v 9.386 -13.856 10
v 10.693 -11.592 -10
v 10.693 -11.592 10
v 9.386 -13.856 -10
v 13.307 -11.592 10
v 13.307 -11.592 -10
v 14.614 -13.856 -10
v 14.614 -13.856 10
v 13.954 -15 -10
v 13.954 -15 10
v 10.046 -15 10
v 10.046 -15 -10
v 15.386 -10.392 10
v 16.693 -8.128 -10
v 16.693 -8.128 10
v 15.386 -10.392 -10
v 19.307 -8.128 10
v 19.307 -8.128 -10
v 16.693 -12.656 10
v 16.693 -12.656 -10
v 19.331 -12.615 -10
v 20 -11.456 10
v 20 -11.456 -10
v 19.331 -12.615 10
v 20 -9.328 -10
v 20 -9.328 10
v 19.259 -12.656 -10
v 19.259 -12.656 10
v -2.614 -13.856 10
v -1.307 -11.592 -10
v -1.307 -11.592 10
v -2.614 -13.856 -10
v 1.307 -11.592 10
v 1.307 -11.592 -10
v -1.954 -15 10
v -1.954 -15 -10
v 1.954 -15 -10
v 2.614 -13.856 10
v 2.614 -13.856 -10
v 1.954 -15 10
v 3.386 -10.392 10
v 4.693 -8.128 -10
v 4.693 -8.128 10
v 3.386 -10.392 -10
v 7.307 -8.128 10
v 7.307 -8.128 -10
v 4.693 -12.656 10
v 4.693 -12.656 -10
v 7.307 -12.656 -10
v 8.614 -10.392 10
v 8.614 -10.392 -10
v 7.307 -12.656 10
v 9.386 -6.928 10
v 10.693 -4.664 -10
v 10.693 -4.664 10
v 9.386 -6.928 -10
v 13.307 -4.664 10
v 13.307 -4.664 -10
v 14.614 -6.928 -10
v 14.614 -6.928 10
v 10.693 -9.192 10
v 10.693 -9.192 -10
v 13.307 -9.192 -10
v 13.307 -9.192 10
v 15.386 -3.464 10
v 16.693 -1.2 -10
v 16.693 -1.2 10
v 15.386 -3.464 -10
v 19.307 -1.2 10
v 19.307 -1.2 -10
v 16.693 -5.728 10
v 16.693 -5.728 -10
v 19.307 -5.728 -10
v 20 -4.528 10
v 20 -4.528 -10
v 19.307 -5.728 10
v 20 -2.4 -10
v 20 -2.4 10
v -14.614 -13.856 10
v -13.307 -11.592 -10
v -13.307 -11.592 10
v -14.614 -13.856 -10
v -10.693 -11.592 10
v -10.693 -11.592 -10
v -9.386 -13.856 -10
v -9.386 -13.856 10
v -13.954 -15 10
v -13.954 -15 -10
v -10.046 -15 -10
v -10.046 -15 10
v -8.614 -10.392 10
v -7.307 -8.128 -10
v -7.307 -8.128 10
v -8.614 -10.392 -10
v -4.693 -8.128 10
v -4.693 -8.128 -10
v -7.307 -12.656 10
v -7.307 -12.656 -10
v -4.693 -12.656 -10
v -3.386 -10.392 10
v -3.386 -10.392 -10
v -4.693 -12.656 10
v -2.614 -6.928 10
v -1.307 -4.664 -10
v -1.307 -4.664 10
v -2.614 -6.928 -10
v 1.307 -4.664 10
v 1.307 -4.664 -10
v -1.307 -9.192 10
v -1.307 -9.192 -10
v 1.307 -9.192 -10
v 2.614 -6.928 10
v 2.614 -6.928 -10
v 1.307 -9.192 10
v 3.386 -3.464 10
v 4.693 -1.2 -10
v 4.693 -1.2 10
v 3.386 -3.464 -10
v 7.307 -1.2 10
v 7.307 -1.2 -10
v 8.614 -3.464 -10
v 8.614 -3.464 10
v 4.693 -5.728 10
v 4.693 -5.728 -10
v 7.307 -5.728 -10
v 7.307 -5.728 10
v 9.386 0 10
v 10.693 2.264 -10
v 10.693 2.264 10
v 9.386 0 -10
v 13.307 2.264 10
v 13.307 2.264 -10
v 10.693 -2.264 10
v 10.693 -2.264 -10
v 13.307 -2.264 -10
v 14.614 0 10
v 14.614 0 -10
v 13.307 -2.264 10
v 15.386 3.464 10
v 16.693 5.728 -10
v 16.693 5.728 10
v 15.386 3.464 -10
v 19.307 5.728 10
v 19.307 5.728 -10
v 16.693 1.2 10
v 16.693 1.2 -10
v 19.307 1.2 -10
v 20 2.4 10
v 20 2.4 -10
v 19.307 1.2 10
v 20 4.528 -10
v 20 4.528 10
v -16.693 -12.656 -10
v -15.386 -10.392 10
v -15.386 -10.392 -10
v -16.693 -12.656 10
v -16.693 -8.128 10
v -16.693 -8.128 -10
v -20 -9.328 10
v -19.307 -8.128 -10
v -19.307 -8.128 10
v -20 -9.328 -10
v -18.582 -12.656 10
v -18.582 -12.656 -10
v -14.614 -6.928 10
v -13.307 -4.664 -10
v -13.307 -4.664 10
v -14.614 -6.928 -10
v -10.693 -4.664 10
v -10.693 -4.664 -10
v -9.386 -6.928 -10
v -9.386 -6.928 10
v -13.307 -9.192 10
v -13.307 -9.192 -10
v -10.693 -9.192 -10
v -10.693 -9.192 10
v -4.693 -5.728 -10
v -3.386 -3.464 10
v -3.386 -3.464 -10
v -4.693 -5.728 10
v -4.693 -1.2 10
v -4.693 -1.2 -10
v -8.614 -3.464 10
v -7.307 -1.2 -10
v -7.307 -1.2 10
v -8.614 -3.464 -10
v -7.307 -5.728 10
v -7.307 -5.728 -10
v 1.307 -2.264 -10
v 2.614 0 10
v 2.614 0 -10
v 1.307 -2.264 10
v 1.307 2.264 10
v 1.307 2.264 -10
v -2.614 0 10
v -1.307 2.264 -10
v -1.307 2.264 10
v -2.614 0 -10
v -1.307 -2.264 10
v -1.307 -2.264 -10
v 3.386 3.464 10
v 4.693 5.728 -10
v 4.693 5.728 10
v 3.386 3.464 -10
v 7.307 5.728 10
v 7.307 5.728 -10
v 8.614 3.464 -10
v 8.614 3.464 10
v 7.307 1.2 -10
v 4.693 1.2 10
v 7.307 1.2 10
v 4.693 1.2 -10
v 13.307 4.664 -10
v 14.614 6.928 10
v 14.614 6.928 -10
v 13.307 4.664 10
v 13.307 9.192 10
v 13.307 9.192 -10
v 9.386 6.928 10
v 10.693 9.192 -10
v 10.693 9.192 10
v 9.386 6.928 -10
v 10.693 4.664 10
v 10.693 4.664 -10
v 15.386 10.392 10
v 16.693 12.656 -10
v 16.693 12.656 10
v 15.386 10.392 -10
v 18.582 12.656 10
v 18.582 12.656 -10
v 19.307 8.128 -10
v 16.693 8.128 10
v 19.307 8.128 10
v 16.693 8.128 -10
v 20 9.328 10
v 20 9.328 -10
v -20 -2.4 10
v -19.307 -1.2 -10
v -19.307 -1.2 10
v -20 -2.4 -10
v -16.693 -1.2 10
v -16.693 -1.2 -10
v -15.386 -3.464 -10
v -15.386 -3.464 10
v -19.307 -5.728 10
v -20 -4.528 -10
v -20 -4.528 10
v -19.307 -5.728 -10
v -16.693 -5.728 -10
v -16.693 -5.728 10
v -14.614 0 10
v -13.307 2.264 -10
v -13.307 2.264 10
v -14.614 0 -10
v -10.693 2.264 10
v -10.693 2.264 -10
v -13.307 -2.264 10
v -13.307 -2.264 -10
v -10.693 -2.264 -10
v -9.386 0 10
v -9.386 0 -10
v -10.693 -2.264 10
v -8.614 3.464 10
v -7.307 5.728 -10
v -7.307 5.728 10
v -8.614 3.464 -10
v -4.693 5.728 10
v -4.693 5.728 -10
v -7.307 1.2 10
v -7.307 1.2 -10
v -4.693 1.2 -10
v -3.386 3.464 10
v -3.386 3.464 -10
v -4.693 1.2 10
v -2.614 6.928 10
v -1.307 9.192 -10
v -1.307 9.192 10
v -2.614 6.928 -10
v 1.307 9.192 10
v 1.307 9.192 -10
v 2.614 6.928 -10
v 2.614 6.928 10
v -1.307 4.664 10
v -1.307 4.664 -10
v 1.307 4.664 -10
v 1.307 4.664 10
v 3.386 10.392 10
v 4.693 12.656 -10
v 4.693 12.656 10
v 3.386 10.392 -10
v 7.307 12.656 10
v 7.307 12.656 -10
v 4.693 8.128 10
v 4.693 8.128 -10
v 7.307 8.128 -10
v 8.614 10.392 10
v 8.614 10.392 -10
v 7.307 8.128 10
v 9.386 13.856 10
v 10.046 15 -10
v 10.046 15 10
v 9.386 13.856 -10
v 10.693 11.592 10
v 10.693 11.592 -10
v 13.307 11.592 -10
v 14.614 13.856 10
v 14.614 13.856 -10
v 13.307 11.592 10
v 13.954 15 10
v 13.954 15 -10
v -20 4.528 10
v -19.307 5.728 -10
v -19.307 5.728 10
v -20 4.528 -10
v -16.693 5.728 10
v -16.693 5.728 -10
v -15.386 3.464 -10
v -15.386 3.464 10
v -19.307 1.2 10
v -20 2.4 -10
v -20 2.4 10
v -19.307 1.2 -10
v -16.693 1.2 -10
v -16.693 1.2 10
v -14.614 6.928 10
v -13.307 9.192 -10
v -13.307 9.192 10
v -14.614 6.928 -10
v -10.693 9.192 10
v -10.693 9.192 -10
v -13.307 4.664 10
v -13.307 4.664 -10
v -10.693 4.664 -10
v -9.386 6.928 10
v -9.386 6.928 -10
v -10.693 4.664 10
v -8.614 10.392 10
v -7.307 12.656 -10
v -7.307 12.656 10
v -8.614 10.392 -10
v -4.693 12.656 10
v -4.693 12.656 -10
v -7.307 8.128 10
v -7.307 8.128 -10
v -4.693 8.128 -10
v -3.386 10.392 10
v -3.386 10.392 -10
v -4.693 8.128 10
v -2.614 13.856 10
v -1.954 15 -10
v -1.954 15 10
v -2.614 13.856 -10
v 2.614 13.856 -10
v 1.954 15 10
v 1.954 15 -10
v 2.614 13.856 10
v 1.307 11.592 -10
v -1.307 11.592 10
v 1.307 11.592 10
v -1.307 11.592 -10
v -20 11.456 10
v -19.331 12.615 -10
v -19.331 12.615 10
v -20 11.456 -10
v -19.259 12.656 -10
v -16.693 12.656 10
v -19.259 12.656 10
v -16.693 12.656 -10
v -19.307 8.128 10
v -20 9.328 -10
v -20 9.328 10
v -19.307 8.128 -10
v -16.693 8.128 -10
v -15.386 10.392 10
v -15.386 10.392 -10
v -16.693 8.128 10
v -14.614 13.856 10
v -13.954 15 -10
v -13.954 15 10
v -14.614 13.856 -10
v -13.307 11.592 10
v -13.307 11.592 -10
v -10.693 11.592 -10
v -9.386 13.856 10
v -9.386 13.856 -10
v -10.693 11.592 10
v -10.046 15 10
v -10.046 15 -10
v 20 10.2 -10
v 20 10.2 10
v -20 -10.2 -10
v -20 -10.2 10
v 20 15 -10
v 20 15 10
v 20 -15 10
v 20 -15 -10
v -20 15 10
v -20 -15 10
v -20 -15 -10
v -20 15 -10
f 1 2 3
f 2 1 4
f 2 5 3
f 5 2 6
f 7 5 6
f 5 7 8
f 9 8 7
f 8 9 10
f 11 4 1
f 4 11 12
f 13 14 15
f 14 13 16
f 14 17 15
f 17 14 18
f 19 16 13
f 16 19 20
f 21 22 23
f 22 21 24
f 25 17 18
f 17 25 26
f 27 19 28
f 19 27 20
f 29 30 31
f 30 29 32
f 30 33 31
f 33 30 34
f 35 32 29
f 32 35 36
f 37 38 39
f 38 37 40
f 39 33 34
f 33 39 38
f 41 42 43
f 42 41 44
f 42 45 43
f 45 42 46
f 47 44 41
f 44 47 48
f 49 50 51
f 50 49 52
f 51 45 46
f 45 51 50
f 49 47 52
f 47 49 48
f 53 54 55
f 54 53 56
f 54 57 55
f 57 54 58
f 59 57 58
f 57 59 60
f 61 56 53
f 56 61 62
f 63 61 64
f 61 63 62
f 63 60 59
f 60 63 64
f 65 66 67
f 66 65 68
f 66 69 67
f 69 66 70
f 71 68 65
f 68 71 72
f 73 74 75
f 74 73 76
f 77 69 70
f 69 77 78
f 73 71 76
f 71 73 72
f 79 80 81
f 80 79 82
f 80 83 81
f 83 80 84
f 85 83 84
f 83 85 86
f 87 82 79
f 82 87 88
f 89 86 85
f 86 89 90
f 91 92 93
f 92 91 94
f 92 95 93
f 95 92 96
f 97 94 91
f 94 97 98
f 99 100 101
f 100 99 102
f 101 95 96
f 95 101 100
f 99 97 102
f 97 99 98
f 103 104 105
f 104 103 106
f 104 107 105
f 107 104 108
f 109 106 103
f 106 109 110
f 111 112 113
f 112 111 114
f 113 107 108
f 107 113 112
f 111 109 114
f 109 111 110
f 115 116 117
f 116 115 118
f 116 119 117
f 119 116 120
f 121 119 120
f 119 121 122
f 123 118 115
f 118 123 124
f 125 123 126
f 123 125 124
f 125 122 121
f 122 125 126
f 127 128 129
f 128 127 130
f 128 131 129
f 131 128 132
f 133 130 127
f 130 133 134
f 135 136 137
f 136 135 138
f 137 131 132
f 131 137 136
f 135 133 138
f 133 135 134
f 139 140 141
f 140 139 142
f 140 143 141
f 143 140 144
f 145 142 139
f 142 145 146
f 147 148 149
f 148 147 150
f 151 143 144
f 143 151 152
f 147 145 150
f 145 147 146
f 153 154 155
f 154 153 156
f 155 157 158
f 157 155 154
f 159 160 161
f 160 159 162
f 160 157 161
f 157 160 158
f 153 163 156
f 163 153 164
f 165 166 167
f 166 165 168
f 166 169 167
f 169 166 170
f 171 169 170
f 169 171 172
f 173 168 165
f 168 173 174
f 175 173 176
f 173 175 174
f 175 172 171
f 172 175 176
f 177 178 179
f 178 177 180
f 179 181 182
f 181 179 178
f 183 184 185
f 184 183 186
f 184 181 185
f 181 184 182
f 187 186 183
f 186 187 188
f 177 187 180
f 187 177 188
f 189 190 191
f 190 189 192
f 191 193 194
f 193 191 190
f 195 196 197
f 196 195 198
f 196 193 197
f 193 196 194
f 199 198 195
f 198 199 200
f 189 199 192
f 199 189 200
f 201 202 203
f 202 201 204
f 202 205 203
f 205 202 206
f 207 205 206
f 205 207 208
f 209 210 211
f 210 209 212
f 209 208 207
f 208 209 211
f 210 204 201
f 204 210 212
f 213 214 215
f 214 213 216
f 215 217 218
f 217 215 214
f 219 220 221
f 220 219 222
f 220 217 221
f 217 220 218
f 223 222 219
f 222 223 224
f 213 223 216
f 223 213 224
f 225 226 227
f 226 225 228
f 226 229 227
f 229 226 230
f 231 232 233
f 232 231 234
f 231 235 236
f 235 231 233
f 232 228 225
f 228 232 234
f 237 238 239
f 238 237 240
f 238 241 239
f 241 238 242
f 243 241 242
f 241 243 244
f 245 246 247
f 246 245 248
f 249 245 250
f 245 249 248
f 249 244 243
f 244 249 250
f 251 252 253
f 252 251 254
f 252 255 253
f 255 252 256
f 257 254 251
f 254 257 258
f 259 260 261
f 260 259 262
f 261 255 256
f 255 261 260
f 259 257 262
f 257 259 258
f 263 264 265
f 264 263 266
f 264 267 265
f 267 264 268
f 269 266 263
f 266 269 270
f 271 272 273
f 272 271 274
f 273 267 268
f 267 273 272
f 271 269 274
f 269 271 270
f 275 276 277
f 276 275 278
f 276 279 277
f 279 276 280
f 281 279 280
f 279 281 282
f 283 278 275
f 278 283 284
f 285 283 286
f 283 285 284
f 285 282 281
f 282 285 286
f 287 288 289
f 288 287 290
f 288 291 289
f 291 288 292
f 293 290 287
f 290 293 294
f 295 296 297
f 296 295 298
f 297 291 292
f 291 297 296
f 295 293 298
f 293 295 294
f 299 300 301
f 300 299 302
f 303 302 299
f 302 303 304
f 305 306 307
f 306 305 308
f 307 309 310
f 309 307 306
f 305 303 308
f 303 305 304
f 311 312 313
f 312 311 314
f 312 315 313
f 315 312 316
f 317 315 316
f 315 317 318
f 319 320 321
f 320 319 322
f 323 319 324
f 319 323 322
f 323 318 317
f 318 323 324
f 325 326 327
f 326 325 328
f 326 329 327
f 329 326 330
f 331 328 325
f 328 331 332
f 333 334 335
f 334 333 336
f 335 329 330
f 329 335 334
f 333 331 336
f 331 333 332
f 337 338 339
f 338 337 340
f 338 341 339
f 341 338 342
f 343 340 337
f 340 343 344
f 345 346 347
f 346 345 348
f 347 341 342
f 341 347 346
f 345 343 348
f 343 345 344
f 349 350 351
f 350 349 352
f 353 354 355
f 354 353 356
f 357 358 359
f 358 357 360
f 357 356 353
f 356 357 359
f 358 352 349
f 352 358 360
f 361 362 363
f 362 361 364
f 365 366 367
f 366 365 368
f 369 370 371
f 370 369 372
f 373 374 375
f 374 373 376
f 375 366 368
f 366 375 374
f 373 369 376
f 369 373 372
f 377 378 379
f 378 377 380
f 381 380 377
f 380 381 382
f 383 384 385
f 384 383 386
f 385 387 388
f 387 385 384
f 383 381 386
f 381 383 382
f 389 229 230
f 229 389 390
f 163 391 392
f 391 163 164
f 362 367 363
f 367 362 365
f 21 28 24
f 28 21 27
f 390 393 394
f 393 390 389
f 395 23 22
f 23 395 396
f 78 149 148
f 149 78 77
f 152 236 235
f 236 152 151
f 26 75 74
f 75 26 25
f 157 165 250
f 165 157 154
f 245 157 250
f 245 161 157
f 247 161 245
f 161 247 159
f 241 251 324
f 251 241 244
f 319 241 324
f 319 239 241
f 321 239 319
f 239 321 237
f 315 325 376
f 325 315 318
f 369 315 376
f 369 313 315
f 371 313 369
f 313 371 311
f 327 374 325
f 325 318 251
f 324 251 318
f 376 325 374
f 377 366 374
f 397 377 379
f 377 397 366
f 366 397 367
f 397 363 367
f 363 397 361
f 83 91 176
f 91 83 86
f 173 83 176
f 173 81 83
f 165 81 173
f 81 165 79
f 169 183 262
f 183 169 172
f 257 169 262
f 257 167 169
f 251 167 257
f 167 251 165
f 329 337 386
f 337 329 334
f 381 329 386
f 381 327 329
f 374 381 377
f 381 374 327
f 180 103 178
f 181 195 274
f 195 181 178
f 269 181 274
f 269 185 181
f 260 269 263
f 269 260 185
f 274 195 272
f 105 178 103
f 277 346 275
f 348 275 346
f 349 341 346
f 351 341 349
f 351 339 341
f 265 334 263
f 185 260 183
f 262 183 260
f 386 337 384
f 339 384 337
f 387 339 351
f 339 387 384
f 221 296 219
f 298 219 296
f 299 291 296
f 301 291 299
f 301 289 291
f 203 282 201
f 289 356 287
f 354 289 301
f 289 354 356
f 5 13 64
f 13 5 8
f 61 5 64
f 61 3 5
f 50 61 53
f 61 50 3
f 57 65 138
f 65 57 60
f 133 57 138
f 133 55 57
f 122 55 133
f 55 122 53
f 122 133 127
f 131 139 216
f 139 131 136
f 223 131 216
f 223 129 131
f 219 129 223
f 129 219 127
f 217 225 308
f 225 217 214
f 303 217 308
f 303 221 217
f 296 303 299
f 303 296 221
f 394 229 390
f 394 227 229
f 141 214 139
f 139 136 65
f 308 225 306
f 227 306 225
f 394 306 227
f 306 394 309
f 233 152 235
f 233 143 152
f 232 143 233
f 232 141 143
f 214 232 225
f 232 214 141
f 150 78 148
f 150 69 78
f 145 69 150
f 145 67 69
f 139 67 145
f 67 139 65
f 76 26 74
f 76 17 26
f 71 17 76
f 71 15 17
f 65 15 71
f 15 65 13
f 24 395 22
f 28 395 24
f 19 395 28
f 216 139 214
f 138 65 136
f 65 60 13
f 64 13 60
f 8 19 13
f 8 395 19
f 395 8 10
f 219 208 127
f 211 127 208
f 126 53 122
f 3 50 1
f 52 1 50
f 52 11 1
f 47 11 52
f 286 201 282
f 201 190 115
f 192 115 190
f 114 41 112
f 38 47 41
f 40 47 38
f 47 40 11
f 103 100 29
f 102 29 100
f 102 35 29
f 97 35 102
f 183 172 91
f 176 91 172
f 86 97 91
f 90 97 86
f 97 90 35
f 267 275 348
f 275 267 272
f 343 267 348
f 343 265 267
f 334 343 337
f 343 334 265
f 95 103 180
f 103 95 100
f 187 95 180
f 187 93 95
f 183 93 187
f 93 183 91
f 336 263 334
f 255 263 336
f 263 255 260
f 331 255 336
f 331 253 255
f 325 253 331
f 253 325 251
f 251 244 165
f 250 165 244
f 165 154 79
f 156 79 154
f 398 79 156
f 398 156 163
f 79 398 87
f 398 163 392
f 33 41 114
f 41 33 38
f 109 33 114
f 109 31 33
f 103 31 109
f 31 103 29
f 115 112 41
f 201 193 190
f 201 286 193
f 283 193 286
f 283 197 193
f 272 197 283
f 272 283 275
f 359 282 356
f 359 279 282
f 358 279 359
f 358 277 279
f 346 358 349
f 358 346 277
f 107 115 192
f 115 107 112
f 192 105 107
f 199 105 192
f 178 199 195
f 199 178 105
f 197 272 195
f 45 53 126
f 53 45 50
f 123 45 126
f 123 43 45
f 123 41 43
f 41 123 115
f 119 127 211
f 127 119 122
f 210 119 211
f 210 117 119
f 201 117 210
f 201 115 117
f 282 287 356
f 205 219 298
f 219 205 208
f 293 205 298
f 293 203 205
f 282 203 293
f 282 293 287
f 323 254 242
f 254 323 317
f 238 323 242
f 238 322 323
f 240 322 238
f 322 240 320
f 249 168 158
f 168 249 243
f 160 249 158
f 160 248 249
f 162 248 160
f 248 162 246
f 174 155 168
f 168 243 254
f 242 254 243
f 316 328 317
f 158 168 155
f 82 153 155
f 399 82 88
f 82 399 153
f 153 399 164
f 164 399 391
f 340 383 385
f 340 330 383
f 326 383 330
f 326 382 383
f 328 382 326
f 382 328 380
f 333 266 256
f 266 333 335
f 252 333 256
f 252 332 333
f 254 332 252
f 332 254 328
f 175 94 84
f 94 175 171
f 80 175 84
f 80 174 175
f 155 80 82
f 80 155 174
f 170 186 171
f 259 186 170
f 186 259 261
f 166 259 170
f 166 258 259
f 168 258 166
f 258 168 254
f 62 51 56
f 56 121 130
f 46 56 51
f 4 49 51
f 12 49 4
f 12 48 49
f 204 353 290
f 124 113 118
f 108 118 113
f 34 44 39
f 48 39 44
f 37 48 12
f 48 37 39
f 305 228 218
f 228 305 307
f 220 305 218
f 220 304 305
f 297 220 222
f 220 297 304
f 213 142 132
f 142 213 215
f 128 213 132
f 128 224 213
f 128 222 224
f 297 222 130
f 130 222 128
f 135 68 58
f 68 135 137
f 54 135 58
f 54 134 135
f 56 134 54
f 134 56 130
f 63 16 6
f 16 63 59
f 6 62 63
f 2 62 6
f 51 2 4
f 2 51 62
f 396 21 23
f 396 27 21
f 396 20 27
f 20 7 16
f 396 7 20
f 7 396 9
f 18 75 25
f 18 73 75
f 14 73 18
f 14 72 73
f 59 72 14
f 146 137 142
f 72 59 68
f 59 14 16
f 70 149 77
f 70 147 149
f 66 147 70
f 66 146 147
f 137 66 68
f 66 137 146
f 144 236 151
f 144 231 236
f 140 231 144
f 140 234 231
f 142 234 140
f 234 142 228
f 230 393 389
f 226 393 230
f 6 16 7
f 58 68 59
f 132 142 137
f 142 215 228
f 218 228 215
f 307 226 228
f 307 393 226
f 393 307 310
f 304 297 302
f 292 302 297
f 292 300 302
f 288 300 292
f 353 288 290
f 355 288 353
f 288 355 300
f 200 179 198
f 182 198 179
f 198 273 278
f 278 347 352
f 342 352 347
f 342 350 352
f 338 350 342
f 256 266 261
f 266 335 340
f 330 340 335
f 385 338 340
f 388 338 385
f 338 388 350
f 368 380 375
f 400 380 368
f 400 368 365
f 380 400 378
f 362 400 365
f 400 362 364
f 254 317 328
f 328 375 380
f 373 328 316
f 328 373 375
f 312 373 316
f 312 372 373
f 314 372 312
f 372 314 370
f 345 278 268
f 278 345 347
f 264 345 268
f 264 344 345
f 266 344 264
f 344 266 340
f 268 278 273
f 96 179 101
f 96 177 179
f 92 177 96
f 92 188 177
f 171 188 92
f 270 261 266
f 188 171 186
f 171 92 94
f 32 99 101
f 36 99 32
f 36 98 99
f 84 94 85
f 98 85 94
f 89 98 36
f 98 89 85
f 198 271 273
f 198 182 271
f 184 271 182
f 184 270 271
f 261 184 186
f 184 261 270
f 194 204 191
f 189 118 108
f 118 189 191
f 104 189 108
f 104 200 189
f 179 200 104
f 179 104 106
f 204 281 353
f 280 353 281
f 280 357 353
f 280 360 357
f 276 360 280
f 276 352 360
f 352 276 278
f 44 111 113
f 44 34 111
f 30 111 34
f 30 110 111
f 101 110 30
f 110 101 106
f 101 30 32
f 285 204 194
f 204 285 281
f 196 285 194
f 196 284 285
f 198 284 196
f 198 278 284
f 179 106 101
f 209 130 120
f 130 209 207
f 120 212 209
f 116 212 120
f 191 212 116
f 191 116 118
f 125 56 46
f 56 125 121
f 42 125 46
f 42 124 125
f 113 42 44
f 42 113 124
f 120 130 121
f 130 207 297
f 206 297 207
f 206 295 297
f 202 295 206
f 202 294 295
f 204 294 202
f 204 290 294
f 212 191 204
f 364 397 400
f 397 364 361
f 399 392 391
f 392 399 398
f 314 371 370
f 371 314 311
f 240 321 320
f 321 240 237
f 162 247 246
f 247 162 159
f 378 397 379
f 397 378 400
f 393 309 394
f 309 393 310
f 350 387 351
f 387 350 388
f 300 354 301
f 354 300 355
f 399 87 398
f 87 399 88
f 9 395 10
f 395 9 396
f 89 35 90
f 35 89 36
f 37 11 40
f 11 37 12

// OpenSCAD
// file: ../scad_reference/oobb_cube_hexagon_cutout_raw.scad
module oobb_cube_hexagon_cutout_raw(sx=100, sy=100, sz=10, cut_sx=100, cut_sy=100, cut_sz=10, hex_r=10, border=10, rot_cut=[0, 0, 0]) {
    // Flat-top hexagon tiling:
    //   col_step = hex_r * sqrt(3)   (horizontal centre-to-centre, same row)
    //   row_step = hex_r * 1.5       (vertical   centre-to-centre)
    //   odd rows are offset by col_step/2
    // Shrink the cutout hexagons relative to the lattice pitch so the
    // requested border width also appears between neighbouring cutouts.
    col_step = hex_r * sqrt(3);
    row_step = hex_r * 1.5;
    hex_cut_r = max(hex_r - border / sqrt(3), 0.01);
    usable_x = cut_sx - border * 2;
    usable_y = cut_sy - border * 2;
    cols = ceil(usable_x / col_step) + 2;
    rows = ceil(usable_y / row_step) + 2;

    // Outer cube minus only the hex-hole portion of the inner workspace.
    difference() {
        cube([sx, sy, sz], center=true);
        rotate(rot_cut)
            intersection() {
                // Inner cube clips the cutout region to keep the edge border.
                cube([usable_x, usable_y, cut_sz + 2], center=true);
                // Hex lattice clipped by the inner cube becomes the subtraction volume.
                for (row = [-rows : rows]) {
                    for (col = [-cols : cols]) {
                        x_off = (row % 2 == 0) ? 0 : col_step / 2;
                        translate([col * col_step + x_off, row * row_step, 0])
                            rotate([0, 0, 30])
                                cylinder(r=hex_cut_r, h=cut_sz + 4, center=true, $fn=6);
                    }
                }
            }
    }
}
// main file
$fn = 50;

use <../scad_reference/oobb_cube_hexagon_cutout_raw.scad>;

difference() {
	union() {
		oobb_cube_hexagon_cutout_raw(border = 2.4, cut_sx = 49.64101615137755, cut_sy = 45.98076211353316, cut_sz = 20.0, hex_r = 4, rot_cut = [0, 0, 30], sx = 40, sy = 30, sz = 20);
	}
	union();
}
